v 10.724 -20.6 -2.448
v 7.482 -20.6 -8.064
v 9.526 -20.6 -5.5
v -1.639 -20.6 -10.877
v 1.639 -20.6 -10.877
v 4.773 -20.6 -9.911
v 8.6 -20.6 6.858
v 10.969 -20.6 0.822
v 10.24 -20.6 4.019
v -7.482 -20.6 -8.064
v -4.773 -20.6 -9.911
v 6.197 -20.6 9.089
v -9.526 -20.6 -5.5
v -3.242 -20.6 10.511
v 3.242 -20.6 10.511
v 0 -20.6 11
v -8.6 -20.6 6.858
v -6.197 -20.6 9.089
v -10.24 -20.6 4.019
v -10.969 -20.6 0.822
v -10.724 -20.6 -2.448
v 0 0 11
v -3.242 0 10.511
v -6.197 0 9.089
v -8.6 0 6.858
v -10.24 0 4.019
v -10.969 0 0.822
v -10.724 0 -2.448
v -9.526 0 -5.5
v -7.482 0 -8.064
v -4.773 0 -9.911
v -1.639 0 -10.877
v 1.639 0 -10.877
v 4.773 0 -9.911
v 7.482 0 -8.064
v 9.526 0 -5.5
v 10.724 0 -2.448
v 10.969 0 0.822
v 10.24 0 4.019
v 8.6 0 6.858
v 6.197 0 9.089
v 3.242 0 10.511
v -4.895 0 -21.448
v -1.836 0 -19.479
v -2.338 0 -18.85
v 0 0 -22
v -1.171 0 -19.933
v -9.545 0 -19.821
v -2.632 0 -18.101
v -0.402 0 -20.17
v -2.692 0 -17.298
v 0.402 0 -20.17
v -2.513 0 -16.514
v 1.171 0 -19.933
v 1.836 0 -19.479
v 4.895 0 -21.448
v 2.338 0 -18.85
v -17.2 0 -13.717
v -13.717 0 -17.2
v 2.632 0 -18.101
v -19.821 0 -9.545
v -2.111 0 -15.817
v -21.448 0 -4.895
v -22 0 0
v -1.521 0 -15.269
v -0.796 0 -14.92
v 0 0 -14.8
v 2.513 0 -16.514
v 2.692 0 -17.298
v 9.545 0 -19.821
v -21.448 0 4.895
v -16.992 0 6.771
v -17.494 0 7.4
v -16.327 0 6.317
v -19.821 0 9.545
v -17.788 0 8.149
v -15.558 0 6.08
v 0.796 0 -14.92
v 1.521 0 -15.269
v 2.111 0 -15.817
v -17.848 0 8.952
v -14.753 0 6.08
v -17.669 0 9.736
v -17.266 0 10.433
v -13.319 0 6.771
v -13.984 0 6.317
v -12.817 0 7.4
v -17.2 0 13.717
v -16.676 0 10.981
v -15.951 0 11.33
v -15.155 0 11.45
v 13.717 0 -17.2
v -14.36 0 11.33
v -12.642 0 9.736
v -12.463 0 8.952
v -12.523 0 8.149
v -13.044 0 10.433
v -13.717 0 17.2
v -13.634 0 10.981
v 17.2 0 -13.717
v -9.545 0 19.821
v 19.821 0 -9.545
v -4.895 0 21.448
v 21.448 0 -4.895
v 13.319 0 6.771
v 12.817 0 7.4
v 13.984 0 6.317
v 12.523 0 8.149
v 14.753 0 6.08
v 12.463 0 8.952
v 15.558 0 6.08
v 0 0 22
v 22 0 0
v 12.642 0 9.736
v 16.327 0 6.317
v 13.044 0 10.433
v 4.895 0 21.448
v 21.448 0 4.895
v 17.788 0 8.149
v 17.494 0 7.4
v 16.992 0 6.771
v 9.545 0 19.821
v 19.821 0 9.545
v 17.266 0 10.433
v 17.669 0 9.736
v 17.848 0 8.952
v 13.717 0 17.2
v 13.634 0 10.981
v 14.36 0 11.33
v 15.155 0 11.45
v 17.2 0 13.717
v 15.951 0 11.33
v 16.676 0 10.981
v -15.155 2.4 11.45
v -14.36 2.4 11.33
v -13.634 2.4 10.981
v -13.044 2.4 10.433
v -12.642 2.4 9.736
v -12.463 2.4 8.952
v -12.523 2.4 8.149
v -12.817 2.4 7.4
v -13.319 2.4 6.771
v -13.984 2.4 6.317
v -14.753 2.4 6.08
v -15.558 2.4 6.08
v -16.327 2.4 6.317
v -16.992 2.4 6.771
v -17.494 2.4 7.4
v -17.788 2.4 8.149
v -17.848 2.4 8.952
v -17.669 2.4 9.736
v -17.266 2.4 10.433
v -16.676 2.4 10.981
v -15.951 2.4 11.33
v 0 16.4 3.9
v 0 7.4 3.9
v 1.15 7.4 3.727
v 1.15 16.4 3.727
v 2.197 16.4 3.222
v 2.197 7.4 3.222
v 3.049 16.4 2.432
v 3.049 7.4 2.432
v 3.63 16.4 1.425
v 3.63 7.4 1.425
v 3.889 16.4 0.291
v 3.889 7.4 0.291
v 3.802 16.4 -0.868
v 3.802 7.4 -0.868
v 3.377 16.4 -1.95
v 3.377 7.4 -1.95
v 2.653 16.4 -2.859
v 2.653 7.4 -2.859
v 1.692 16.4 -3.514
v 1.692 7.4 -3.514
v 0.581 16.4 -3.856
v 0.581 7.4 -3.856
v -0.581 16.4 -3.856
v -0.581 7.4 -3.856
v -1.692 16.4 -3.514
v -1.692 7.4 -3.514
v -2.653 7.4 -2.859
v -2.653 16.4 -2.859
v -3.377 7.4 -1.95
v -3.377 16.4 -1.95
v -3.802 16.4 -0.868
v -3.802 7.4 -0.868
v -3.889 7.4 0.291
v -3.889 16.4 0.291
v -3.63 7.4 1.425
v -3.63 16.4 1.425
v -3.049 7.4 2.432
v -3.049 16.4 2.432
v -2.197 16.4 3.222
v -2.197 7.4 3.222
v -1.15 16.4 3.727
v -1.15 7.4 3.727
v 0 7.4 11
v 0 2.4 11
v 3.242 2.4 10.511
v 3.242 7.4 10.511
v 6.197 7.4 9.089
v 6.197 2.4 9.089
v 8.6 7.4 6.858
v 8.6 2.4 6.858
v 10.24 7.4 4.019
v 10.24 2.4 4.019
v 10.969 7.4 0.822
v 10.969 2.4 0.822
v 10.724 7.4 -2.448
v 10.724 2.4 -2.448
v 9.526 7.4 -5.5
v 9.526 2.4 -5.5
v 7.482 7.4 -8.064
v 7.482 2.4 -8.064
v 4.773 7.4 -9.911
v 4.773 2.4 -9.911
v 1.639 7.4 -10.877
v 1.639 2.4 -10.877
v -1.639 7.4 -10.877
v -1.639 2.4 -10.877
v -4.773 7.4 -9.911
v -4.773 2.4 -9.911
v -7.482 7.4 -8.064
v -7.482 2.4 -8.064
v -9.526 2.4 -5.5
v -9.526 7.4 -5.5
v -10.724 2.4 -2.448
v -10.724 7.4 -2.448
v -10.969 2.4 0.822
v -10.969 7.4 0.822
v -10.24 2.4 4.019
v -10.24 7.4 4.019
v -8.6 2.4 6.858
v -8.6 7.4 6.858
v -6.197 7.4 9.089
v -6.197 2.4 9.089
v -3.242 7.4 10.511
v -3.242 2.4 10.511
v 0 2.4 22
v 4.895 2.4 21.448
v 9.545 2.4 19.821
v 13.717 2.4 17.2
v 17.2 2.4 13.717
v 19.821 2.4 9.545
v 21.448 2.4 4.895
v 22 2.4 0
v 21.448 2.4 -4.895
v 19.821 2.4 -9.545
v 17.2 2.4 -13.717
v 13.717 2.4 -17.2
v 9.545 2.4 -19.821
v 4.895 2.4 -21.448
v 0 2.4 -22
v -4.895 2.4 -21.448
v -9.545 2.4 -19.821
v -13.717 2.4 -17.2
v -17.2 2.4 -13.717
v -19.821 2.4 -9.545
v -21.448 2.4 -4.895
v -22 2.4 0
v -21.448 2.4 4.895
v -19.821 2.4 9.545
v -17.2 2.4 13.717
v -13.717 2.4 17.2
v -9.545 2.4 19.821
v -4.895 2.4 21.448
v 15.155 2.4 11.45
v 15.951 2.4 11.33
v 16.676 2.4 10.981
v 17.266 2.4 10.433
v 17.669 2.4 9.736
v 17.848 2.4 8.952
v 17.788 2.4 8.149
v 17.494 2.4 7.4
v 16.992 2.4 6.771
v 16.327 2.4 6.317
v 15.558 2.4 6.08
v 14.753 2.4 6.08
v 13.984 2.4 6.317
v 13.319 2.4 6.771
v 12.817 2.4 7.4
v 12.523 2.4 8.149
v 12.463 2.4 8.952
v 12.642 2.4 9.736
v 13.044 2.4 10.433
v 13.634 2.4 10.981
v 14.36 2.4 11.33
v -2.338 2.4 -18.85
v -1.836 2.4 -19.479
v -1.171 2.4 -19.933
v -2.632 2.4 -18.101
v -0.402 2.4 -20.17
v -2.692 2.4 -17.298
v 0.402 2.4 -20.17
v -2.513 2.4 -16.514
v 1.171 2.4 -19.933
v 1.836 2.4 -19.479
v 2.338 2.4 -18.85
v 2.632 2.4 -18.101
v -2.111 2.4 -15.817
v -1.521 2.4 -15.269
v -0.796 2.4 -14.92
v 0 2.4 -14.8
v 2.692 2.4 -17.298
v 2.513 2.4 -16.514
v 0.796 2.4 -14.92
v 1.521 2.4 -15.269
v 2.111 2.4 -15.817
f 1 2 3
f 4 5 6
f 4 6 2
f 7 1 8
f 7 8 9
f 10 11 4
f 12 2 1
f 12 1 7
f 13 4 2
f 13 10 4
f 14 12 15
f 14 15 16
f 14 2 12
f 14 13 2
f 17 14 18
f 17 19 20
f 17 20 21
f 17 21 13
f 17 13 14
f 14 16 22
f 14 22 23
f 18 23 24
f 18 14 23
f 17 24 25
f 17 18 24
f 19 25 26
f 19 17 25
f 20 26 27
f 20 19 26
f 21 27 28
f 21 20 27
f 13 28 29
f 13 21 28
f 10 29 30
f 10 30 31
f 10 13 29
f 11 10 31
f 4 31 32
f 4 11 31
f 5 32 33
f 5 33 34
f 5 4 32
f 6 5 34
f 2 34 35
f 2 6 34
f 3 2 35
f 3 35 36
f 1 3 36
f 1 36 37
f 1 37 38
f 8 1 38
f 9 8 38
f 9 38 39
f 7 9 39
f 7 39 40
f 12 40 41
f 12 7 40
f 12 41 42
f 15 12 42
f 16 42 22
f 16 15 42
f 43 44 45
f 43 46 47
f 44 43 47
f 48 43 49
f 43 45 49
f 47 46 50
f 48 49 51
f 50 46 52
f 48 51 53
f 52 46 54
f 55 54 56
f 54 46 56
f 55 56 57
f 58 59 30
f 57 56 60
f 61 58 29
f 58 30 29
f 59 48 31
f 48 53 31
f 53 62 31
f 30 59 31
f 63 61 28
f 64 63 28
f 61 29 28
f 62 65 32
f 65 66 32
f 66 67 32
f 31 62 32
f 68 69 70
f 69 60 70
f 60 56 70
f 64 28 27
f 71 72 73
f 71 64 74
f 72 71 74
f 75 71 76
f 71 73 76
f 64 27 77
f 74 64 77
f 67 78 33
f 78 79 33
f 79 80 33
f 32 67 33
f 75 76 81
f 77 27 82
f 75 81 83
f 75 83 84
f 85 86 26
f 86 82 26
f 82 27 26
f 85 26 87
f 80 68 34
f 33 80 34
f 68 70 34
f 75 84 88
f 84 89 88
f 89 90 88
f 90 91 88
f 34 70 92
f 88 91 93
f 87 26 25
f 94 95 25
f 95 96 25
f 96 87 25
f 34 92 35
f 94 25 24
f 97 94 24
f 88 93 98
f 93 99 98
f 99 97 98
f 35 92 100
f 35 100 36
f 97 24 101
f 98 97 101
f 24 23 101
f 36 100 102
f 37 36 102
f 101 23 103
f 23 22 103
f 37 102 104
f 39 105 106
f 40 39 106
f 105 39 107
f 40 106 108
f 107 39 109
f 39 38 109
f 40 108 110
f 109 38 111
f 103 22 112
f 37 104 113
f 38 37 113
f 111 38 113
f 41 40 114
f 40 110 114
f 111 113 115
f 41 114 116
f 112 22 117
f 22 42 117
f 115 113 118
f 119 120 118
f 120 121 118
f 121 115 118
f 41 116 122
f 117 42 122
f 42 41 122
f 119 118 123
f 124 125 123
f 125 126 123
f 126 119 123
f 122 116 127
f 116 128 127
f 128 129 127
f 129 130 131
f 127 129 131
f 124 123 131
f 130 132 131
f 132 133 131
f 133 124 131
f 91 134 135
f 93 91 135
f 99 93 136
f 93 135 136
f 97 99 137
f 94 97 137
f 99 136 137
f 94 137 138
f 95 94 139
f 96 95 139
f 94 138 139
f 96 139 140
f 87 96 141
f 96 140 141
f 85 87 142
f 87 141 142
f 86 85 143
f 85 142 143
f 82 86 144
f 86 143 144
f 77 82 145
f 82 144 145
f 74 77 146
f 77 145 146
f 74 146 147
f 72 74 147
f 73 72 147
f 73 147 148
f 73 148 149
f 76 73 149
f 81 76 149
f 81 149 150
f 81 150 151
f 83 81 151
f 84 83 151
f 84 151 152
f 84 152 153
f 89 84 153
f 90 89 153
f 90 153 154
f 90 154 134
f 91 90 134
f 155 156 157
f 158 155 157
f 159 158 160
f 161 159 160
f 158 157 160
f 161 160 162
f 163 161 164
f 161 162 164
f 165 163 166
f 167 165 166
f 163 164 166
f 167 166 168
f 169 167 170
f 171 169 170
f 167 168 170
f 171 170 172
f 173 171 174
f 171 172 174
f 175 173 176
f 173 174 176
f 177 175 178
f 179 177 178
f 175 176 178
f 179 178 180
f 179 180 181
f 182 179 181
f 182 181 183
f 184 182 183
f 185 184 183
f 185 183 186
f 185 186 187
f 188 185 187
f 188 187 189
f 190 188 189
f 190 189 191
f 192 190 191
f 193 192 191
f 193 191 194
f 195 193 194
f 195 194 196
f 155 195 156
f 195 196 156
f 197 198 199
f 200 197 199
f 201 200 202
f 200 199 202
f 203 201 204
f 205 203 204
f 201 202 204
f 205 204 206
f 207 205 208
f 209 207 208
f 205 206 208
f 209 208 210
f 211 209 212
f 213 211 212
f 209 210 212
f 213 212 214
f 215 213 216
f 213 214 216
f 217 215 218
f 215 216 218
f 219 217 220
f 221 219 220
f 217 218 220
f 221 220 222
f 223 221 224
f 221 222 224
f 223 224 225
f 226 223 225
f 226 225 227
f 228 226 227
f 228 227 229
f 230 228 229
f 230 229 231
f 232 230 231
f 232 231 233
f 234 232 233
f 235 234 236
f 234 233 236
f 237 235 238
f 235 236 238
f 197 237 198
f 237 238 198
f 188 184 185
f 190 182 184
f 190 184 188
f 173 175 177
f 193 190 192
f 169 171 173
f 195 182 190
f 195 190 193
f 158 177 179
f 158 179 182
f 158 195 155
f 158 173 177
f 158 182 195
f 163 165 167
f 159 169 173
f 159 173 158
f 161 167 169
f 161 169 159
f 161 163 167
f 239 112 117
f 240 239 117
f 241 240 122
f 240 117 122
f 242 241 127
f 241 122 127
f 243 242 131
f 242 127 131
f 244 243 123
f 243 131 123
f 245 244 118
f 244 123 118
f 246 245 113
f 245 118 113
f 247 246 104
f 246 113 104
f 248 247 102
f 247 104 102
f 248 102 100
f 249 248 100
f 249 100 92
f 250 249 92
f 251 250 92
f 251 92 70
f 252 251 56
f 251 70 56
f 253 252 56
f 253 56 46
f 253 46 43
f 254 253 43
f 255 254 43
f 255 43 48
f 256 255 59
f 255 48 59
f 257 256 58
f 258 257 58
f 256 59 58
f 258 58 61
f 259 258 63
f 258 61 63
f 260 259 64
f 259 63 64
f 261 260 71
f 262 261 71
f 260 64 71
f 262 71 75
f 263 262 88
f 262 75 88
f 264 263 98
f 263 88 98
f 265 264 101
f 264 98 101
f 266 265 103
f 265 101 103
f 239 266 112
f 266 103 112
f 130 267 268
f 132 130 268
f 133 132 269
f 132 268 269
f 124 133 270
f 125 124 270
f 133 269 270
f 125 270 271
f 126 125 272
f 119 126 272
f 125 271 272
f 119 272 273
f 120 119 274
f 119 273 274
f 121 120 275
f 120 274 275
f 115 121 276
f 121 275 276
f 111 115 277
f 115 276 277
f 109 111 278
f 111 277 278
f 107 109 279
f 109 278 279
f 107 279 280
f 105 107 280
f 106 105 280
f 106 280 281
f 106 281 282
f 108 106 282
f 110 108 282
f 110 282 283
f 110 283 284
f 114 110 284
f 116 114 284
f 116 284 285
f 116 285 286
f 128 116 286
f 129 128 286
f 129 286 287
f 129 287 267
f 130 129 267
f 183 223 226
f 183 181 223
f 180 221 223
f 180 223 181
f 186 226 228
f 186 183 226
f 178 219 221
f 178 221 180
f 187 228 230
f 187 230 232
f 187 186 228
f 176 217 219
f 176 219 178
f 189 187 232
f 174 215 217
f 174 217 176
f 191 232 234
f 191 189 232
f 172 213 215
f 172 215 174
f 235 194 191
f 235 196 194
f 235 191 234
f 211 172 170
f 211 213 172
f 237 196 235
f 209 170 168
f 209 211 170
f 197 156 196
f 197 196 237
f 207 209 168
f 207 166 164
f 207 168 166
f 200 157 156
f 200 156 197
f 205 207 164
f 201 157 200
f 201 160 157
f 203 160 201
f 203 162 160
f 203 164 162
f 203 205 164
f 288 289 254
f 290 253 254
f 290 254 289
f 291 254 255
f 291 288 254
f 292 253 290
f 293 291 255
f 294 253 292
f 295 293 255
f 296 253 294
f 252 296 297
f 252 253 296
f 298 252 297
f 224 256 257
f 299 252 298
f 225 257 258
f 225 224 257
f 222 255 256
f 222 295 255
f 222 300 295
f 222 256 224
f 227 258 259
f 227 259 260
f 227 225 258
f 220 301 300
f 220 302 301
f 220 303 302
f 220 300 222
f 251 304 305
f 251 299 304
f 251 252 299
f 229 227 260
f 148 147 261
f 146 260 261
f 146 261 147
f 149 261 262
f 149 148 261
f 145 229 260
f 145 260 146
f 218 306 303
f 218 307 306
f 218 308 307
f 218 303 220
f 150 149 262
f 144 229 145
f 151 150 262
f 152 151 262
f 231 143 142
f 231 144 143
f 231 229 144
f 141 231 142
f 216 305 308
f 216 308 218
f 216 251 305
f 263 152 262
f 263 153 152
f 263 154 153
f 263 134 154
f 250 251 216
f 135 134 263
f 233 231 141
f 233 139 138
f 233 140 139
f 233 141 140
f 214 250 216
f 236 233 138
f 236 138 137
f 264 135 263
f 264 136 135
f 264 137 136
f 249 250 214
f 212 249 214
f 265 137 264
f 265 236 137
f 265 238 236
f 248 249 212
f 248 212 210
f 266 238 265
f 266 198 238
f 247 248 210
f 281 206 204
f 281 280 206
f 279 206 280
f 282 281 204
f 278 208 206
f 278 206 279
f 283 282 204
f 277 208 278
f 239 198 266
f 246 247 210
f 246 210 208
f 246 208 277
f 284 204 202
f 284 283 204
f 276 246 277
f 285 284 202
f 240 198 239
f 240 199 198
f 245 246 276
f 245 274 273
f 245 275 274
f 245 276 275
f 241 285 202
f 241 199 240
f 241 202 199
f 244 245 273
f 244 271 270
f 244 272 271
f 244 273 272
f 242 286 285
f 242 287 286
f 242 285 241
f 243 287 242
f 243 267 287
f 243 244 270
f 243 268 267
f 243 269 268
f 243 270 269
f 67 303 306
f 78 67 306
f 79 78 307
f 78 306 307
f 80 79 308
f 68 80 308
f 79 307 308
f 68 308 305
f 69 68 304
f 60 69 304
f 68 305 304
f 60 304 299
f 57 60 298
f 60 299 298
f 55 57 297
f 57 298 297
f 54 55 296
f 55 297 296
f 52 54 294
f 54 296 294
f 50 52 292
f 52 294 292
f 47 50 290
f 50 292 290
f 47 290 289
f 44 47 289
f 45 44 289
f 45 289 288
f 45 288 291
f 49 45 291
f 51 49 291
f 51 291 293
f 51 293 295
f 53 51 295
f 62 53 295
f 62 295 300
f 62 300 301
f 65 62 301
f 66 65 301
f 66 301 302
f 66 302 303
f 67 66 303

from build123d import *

# Parameters (mm, degrees)
SKETCH1_R           = 22
BOSS_EXTRUDE1_DEPTH = 2.4
SKETCH2_R           = 11
BOSS_EXTRUDE2_DEPTH = 5
SKETCH3_R           = 3.9
BOSS_EXTRUDE3_DEPTH = 9
BOSS_EXTRUDE4_START = 20.6
SKETCH4_R           = 11
BOSS_EXTRUDE4_DEPTH = 20.6
SKETCH5_R           = 2.7
CUT_EXTRUDE1_DEPTH  = 39.691084244


with BuildPart() as part:
    # Sketch1 → Boss-Extrude1 (new body)
    with BuildSketch(Plane(origin=(0, 0, 0), x_dir=(1, 0, 0), z_dir=(0, 1, 0))):
        with Locations(Location((0, 0, 0), (0, 0, 270))):
            Circle(SKETCH1_R)
    extrude(amount=BOSS_EXTRUDE1_DEPTH)

    # Sketch2 → Boss-Extrude2 (add)
    with BuildSketch(Plane(origin=(0, 2.4, 0), x_dir=(1, 0, 0), z_dir=(0, 1, 0))):
        with Locations(Location((0, 0, 0), (0, 0, 270))):
            Circle(SKETCH2_R)
    extrude(amount=BOSS_EXTRUDE2_DEPTH)

    # Sketch3 → Boss-Extrude3 (add)
    with BuildSketch(Plane(origin=(0, 7.4, 0), x_dir=(1, 0, 0), z_dir=(0, 1, 0))):
        with Locations(Location((0, 0, 0), (0, 0, 270))):
            Circle(SKETCH3_R)
    extrude(amount=BOSS_EXTRUDE3_DEPTH)

    # Sketch4 → Boss-Extrude4 (add)
    with BuildSketch(Plane.XZ.offset(BOSS_EXTRUDE4_START)):
        with Locations(Location((0, 0, 0), (0, 0, 90))):
            Circle(SKETCH4_R)
    extrude(amount=-BOSS_EXTRUDE4_DEPTH)

    # Sketch5 → Cut-Extrude1 (cut, through all)
    with BuildSketch(Plane(origin=(0, 2.4, 0), x_dir=(1, 0, 0), z_dir=(0, 1, 0))):
        with Locations(Location((0, 17.5, 0), (0, 0, 270))):
            Circle(SKETCH5_R)
        with Locations(Location((-15.155444566, -8.75, 0), (0, 0, 270))):
            Circle(SKETCH5_R)
        with Locations(Location((15.155444566, -8.75, 0), (0, 0, 270))):
            Circle(SKETCH5_R)
    extrude(amount=-CUT_EXTRUDE1_DEPTH, mode=Mode.SUBTRACT)


solid = part.part
